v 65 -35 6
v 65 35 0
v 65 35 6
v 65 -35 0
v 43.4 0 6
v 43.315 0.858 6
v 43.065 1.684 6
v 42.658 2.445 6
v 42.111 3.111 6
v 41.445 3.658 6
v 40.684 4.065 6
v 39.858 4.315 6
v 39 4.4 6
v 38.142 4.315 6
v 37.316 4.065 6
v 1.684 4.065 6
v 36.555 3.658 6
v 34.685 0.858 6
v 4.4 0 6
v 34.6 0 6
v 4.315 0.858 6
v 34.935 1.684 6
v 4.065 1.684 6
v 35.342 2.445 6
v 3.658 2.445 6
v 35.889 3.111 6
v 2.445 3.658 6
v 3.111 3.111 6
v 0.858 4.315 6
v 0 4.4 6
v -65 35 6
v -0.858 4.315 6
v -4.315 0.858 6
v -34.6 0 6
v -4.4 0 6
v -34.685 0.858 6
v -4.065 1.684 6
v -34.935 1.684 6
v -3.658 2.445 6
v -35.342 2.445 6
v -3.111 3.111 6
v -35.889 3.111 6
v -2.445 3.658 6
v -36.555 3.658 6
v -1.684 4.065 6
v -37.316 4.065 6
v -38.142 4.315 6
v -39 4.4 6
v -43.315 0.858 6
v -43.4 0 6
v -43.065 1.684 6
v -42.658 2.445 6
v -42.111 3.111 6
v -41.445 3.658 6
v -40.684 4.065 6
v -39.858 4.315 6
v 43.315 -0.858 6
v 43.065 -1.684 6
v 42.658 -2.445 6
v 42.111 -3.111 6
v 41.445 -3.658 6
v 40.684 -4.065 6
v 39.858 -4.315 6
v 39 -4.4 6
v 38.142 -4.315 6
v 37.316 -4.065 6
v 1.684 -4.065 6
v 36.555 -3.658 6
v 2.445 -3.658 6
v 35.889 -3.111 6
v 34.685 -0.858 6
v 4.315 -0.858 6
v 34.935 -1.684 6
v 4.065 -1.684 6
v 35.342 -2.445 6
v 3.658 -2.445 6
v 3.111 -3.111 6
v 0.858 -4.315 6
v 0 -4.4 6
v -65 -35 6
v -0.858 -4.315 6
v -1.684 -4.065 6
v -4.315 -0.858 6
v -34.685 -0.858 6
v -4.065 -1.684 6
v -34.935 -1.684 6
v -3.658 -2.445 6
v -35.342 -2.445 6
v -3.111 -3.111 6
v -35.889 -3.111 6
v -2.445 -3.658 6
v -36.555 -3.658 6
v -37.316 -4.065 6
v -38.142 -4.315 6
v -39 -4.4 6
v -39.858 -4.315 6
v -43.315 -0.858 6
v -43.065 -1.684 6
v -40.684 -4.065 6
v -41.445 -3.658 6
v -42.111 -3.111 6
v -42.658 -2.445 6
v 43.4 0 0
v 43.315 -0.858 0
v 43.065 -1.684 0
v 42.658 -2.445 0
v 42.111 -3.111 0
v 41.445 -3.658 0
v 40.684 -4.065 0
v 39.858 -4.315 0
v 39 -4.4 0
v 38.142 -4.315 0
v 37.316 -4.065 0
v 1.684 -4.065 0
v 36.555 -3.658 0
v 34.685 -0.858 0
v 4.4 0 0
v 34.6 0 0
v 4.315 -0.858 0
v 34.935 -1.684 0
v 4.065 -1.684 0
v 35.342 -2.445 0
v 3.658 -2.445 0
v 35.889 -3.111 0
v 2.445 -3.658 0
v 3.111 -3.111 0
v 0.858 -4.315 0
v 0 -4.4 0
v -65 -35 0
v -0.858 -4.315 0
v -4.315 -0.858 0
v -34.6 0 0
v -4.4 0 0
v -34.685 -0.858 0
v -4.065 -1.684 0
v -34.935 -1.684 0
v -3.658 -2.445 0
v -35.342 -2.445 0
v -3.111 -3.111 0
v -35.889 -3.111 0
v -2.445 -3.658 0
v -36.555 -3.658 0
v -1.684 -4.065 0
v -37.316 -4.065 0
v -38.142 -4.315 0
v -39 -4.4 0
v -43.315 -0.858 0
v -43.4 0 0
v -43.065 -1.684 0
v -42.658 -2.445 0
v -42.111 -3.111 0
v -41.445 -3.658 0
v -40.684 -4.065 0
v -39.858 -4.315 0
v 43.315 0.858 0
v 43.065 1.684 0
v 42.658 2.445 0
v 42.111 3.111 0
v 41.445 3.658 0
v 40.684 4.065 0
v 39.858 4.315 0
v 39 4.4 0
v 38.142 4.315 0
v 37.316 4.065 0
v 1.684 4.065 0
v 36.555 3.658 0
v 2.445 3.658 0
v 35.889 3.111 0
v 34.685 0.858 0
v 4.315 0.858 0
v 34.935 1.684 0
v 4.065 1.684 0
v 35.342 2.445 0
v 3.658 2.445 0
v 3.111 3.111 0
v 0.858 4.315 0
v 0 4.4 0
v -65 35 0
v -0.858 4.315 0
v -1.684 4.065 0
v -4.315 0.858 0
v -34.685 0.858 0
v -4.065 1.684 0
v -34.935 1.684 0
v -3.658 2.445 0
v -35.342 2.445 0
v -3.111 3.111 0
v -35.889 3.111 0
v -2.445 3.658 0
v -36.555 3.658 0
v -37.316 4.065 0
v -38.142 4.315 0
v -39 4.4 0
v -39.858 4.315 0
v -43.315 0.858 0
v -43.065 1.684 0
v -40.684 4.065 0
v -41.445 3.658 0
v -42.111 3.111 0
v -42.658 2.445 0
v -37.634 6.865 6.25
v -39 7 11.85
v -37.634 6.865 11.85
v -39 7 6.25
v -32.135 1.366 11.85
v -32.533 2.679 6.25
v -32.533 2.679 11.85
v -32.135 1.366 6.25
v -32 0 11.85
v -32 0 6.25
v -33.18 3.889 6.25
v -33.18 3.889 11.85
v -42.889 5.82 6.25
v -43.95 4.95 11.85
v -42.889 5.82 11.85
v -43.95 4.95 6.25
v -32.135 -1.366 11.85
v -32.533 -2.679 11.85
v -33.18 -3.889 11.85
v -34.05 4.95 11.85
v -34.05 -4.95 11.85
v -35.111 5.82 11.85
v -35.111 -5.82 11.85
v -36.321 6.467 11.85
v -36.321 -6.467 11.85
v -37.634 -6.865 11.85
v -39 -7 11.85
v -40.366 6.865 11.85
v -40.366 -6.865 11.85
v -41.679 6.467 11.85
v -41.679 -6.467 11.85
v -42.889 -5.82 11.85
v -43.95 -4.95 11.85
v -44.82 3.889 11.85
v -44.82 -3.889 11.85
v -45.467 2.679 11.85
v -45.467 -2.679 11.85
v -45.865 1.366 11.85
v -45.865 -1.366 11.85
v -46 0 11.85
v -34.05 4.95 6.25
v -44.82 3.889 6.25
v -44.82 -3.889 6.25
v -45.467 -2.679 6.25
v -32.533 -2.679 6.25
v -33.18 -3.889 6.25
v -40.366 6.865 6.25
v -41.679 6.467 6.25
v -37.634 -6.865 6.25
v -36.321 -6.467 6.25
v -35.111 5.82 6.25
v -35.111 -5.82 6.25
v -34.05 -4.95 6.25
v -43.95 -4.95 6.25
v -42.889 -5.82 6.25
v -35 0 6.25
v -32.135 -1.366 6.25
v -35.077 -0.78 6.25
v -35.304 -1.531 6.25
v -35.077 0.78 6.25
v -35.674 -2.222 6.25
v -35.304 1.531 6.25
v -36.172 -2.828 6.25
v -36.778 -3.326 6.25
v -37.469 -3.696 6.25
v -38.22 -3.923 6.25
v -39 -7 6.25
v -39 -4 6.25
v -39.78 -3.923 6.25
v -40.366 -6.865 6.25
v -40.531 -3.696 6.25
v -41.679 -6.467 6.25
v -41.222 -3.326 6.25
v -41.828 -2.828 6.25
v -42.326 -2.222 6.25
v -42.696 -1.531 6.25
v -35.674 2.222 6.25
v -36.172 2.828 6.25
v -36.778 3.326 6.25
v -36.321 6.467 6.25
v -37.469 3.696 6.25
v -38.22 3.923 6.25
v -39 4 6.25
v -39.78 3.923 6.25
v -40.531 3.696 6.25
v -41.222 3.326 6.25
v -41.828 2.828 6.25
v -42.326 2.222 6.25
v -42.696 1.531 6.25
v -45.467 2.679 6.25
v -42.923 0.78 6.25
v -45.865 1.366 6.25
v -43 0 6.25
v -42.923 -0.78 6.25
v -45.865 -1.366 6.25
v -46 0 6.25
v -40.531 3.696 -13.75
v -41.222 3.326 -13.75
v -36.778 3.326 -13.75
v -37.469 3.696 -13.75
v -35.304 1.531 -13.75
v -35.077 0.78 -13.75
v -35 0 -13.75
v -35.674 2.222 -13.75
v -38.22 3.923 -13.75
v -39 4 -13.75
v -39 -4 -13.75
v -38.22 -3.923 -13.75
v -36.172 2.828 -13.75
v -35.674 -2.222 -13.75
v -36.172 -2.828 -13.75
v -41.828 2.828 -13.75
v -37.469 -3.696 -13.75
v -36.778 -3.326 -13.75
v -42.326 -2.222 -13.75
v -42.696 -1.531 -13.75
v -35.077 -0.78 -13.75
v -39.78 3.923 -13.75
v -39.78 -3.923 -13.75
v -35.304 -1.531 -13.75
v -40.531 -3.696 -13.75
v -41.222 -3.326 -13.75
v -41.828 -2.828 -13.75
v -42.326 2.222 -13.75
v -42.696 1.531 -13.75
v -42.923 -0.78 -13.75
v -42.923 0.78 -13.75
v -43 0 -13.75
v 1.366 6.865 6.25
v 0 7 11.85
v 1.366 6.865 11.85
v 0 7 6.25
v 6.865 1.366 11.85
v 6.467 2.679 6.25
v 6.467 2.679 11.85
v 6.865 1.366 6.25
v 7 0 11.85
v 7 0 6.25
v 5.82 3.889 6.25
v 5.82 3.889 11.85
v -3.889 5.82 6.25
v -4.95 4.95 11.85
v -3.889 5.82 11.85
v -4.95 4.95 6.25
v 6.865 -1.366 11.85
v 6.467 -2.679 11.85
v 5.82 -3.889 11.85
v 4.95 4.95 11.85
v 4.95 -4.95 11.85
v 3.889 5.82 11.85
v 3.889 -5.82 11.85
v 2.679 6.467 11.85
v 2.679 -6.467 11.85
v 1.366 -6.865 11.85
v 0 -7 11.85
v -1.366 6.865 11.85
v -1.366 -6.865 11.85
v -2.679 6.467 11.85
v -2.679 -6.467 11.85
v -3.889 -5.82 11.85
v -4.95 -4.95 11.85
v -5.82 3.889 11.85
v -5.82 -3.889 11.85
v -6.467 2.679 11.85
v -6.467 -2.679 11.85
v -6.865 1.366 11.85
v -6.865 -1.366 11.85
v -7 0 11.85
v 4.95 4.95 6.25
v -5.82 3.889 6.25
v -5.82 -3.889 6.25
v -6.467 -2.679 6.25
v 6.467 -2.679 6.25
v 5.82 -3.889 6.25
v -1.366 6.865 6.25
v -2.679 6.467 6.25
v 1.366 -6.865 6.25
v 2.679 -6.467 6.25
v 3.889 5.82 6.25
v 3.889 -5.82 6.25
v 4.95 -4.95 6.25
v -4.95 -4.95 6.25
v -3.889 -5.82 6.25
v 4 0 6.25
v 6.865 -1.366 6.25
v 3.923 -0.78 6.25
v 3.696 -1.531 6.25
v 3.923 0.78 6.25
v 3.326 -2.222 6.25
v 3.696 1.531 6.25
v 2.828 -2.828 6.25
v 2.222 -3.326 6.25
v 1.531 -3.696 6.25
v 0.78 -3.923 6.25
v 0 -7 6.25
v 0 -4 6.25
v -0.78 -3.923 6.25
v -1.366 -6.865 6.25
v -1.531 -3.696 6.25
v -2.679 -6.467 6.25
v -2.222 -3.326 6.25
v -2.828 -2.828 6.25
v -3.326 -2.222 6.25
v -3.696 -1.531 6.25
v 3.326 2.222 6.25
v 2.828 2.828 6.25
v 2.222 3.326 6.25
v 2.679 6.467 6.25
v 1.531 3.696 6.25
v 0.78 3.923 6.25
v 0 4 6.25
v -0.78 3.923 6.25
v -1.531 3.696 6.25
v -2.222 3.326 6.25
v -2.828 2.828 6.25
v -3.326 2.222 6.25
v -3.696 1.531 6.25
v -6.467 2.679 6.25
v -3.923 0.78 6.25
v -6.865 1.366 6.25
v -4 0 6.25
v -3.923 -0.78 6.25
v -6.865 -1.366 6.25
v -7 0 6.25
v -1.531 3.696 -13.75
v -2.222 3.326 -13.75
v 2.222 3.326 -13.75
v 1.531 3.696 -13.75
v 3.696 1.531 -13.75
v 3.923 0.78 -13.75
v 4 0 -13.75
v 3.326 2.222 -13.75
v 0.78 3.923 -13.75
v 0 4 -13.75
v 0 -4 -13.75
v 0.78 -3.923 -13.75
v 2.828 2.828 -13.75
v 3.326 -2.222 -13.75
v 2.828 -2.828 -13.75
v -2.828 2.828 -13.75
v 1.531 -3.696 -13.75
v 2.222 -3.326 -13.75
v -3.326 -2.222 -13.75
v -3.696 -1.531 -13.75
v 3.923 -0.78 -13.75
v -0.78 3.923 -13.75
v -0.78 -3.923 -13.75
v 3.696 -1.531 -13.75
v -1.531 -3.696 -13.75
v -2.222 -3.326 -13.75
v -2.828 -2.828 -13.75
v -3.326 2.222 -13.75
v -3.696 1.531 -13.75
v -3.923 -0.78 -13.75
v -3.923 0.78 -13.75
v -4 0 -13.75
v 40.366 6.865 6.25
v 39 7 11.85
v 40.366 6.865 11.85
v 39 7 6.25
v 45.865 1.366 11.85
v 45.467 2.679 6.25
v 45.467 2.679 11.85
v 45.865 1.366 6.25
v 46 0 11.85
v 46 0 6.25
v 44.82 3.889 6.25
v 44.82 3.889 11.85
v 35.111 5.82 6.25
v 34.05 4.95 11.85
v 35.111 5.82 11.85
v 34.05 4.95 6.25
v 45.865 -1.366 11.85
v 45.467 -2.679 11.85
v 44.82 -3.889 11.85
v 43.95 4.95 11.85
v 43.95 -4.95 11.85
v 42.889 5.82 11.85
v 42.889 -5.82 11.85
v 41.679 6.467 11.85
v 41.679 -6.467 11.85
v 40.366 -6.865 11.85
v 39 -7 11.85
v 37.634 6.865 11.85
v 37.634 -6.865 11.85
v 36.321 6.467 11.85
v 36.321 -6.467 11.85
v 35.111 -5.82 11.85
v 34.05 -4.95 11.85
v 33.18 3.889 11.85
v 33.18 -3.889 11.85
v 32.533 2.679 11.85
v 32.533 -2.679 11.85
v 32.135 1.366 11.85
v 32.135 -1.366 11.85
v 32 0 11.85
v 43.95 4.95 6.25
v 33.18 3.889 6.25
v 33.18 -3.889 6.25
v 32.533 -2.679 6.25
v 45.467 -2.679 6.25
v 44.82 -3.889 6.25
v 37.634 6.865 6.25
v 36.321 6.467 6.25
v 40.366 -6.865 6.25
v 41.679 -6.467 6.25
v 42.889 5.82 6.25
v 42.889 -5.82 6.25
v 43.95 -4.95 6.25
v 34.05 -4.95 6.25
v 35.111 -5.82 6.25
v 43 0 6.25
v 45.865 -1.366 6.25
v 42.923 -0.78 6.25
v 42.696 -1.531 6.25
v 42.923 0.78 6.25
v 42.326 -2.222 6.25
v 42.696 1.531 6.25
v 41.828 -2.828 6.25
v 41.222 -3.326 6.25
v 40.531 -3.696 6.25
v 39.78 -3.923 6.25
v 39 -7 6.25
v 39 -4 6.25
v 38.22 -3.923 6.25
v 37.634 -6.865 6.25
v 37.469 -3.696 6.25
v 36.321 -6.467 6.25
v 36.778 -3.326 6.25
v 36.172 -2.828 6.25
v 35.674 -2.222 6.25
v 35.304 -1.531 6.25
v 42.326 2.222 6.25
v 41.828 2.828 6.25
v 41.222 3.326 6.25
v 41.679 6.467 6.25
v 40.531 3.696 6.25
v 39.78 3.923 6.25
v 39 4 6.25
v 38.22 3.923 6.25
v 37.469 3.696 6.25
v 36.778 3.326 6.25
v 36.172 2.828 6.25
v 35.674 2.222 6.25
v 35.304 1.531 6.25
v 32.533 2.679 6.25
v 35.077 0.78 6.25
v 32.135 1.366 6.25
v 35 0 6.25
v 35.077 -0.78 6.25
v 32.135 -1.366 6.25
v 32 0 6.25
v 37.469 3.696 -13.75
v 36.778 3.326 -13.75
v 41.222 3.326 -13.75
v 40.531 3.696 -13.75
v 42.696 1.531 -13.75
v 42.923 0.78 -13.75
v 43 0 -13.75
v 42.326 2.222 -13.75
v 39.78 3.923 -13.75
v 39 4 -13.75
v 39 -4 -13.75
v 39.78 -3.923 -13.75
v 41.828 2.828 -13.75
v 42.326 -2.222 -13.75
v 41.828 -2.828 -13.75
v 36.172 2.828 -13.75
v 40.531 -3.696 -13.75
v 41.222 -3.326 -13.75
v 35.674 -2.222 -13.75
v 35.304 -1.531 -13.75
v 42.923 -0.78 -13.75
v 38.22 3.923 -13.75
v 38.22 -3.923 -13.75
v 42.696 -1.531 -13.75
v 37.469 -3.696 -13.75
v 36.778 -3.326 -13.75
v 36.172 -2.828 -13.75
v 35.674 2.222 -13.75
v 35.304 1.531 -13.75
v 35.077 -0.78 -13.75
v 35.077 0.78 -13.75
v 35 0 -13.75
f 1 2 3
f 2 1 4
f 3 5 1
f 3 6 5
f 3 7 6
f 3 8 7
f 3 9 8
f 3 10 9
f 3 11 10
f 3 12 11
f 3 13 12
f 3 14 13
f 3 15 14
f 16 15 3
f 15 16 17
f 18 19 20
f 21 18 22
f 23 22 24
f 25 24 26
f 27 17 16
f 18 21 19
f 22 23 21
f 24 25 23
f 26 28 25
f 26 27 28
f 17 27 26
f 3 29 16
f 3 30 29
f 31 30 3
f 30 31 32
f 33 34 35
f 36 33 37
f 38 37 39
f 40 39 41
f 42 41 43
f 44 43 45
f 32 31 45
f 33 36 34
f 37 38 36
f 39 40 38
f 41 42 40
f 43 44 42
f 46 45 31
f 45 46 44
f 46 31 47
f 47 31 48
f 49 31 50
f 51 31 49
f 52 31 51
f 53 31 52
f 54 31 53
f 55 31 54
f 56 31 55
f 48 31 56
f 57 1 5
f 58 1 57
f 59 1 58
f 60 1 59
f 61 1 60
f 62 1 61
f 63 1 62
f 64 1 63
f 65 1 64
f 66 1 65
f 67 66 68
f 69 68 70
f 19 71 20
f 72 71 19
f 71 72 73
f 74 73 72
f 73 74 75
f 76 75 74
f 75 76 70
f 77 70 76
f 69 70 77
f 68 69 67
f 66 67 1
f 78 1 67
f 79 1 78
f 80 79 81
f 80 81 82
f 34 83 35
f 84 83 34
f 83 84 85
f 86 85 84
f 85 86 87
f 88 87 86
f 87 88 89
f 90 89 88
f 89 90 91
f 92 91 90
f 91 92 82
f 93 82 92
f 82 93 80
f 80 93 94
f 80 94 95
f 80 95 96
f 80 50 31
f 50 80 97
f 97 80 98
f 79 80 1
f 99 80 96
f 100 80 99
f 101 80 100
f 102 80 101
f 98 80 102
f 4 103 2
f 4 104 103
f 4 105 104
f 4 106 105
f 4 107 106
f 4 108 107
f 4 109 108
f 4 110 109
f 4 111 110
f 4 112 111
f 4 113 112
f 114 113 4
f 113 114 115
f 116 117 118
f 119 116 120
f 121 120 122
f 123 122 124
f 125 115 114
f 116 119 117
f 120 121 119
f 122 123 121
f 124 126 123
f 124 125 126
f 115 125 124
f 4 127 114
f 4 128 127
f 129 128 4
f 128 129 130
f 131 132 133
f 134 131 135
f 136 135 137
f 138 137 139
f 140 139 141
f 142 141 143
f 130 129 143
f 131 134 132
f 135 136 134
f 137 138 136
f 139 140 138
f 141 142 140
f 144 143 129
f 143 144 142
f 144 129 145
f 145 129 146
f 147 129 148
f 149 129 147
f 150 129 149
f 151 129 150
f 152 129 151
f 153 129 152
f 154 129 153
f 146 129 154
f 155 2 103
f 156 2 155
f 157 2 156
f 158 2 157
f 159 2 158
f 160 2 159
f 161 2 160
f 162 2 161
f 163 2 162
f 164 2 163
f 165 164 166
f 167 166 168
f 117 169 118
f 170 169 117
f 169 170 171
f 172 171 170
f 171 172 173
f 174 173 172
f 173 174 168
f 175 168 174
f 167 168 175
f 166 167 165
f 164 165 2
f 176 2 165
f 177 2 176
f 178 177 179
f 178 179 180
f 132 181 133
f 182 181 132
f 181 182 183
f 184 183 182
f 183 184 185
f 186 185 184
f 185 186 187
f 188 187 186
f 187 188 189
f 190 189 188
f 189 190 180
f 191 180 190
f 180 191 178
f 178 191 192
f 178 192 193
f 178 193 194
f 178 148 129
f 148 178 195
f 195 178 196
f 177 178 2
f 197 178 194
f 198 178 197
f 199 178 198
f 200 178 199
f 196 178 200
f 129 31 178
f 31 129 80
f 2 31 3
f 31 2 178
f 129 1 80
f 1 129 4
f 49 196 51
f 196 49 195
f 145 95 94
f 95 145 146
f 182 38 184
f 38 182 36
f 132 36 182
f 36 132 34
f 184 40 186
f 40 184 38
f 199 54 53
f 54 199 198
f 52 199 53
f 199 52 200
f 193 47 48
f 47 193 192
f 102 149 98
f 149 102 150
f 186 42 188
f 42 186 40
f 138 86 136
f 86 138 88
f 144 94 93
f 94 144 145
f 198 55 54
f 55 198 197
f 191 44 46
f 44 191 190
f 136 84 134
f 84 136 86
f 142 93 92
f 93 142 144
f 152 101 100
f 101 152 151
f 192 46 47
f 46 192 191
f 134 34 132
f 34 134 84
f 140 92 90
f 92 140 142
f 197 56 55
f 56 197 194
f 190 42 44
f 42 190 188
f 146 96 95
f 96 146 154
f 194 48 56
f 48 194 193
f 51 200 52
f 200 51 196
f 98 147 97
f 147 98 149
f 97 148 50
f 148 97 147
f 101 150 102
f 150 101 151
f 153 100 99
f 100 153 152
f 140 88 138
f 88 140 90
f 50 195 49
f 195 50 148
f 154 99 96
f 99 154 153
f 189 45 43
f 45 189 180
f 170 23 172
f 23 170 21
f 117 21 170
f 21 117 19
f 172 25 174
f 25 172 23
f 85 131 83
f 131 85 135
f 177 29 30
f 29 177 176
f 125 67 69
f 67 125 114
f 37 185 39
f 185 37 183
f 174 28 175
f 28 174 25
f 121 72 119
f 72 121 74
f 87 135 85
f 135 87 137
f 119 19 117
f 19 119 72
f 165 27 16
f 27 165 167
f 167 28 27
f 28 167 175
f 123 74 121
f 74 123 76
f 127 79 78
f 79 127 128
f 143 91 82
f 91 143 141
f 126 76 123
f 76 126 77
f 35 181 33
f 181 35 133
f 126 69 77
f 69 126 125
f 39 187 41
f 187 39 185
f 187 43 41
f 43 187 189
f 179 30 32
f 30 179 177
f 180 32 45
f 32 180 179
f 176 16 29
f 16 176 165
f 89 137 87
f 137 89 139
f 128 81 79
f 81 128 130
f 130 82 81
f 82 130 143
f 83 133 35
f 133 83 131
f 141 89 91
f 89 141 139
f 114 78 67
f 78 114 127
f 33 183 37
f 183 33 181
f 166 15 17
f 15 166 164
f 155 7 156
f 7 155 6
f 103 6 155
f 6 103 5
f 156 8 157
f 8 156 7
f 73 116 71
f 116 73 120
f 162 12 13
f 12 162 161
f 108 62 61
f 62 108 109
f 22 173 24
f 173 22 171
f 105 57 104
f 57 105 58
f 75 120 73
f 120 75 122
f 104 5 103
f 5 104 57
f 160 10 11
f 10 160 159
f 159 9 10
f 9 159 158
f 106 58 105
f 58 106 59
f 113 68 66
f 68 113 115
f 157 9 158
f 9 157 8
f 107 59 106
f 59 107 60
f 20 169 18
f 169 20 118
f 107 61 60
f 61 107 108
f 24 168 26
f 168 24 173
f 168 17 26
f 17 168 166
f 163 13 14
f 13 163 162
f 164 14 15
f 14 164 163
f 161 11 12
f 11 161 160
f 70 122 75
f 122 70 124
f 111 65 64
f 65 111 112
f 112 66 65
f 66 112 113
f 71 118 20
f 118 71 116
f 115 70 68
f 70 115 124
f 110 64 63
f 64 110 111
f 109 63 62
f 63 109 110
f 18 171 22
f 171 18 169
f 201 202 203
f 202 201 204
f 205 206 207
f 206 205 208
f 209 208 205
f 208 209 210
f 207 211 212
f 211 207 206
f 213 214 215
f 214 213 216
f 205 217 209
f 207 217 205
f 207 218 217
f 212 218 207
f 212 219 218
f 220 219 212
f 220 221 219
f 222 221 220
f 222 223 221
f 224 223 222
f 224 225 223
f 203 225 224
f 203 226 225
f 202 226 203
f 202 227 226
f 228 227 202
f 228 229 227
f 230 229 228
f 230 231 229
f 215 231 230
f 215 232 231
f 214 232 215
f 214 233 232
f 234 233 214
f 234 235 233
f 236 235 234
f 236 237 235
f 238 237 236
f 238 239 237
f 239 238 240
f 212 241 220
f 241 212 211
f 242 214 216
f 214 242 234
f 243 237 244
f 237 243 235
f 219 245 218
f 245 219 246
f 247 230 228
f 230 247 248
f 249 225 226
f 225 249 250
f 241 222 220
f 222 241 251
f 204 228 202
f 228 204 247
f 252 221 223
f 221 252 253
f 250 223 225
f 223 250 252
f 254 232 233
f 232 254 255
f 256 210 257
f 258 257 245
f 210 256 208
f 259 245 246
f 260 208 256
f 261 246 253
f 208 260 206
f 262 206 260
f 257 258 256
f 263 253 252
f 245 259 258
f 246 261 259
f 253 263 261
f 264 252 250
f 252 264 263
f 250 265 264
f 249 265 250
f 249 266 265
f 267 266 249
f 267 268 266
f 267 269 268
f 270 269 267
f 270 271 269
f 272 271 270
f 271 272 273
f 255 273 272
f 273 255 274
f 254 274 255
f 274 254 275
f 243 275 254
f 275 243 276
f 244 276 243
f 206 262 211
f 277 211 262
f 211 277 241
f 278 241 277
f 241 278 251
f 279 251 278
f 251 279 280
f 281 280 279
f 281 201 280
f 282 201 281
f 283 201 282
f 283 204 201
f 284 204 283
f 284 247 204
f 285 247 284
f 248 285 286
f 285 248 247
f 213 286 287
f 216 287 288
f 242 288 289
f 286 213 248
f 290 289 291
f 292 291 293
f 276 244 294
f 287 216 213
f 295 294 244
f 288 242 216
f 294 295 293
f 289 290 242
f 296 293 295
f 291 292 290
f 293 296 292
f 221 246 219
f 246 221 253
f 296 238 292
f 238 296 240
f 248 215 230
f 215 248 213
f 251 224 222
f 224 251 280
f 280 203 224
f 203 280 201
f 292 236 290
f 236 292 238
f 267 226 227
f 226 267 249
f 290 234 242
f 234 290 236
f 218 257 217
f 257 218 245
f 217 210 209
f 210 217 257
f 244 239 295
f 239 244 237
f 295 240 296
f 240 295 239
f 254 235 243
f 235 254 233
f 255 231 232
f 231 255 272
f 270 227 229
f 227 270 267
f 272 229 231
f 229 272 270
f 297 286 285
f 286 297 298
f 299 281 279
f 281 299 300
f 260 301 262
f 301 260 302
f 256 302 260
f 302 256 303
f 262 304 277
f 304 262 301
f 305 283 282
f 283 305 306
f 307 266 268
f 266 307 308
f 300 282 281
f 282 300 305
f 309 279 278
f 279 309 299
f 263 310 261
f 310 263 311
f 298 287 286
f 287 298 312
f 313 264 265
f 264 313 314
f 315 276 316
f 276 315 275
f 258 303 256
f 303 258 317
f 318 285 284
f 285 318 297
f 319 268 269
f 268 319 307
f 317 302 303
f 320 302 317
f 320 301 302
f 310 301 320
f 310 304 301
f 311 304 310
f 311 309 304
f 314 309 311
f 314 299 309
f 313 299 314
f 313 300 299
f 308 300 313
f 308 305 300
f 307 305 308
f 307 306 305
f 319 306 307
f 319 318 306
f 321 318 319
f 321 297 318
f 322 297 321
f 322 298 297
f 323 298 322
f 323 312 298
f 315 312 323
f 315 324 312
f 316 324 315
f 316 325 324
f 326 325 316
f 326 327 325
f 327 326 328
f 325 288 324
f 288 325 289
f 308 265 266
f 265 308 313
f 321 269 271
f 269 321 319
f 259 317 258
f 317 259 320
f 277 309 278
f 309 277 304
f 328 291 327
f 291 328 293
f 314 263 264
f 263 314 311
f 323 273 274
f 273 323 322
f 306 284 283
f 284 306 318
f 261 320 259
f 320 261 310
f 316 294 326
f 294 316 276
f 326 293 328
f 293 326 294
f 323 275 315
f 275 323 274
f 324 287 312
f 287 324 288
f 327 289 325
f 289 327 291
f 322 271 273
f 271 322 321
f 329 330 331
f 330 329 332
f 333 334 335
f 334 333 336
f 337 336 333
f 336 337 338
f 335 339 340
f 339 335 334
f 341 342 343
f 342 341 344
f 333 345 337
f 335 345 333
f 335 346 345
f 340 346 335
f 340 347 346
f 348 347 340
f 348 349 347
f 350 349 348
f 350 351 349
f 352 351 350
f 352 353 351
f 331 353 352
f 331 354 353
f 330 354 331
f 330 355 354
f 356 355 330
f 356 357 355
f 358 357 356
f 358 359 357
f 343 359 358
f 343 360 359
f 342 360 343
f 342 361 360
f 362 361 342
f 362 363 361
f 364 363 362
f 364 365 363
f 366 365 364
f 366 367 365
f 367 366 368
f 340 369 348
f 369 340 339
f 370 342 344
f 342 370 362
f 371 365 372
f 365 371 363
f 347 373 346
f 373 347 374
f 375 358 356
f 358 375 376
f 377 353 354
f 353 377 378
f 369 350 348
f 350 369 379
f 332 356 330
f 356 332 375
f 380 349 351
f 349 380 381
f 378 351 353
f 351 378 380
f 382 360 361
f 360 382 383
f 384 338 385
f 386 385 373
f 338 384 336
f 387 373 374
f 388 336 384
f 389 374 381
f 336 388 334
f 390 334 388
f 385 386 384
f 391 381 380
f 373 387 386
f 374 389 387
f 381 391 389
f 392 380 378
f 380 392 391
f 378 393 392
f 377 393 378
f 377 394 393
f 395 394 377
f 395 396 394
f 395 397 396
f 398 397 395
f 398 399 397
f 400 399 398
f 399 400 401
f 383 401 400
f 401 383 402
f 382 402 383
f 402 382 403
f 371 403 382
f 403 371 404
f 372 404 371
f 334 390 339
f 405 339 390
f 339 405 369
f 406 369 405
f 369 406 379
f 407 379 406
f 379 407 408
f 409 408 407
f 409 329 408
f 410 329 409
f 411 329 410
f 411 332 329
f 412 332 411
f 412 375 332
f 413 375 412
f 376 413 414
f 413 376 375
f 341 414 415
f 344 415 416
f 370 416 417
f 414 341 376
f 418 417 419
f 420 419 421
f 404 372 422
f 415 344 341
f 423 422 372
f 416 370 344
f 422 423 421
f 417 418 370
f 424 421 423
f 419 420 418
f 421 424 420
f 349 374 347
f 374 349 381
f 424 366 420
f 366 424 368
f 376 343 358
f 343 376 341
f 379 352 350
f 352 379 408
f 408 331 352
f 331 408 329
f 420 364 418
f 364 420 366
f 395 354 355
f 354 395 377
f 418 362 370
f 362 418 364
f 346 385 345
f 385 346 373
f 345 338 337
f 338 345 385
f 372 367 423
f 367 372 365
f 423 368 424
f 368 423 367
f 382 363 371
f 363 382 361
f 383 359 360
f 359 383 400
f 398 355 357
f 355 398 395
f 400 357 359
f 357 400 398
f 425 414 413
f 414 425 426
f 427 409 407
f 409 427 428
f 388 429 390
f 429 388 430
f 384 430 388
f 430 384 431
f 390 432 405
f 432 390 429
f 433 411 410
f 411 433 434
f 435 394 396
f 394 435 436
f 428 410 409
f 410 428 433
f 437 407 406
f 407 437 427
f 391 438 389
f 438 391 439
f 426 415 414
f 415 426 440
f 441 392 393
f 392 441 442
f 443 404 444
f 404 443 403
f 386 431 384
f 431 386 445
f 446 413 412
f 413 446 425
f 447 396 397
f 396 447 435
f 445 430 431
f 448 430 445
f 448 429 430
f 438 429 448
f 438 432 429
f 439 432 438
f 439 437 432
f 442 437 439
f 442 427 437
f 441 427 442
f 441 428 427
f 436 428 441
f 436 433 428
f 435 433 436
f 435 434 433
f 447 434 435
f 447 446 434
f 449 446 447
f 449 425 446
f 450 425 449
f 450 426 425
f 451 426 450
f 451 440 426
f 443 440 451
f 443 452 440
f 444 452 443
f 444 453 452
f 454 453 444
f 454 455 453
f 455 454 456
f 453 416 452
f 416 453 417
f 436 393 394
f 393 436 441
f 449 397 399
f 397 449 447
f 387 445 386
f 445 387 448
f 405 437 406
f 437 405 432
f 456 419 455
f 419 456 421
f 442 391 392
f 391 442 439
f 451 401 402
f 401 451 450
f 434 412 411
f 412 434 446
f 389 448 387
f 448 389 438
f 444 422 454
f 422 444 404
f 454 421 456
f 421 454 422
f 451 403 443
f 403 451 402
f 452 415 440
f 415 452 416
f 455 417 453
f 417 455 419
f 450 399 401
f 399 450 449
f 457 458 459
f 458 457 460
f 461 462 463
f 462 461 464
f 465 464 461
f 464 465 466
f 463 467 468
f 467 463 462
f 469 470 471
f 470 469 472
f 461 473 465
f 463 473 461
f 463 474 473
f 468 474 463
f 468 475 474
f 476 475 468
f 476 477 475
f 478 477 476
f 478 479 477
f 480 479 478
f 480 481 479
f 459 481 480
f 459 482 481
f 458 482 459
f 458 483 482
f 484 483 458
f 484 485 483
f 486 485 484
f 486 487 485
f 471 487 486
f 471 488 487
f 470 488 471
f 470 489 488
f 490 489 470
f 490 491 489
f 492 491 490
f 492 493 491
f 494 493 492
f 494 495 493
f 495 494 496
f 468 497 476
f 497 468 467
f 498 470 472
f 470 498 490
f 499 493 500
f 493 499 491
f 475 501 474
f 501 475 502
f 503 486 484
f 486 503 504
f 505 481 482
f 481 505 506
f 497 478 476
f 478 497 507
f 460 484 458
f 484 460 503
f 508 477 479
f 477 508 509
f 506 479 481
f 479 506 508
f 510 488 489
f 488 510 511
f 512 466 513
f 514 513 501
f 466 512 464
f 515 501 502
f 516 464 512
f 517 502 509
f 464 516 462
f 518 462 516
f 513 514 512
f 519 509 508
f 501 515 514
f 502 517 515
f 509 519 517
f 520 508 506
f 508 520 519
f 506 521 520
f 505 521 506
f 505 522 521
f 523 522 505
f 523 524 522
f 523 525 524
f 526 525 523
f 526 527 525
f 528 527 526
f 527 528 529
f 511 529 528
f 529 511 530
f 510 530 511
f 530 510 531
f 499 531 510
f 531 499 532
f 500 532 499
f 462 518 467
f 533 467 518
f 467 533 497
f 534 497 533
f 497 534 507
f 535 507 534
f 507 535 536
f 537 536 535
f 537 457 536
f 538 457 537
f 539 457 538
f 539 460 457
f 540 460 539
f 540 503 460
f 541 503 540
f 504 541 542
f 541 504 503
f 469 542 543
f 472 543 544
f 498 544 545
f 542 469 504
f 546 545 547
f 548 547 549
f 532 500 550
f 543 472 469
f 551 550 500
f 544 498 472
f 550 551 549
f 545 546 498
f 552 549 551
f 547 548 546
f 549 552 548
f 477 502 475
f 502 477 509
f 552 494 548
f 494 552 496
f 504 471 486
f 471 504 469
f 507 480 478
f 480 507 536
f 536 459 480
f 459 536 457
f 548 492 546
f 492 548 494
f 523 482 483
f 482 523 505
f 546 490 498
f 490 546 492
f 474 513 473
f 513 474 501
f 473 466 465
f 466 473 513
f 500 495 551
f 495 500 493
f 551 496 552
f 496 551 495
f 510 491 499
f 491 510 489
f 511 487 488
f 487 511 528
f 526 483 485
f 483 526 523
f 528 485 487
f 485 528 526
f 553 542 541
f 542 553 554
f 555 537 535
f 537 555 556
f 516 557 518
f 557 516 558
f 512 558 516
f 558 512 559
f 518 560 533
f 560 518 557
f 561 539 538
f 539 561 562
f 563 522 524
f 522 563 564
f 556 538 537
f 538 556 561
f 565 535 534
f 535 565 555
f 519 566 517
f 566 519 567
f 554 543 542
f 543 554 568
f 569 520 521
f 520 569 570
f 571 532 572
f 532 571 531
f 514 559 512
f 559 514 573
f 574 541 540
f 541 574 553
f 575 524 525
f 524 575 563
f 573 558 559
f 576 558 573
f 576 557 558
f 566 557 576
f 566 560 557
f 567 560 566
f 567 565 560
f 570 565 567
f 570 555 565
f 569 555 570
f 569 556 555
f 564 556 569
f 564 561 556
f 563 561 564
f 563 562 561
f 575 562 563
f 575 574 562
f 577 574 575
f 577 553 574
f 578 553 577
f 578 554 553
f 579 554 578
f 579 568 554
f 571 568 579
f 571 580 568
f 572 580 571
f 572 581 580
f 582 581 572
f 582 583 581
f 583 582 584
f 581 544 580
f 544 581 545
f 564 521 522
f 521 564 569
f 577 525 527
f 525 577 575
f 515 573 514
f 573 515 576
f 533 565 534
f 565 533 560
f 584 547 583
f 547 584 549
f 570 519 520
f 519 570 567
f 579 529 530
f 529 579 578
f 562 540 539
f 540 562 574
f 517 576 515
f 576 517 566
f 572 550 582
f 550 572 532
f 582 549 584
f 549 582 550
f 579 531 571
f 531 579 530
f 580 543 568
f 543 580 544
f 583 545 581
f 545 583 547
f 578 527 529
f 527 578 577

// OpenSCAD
$fn = 32;

// ------------------------------------------------------------------------
// Bolted plate: 130 x 70 x 6 mm plate, 3 fasteners
// Every part is its own module, assembly() places them once.
// ------------------------------------------------------------------------

// --- part 1 ---
module plate() {
  difference() {
    translate([-65, -35, 0]) cube([130, 70, 6]);
    translate([-39, 0, -1]) cylinder(h = 8, d = 8.8);
    translate([0, 0, -1]) cylinder(h = 8, d = 8.8);
    translate([39, 0, -1]) cylinder(h = 8, d = 8.8);
  }
}

// --- part 2 ---
module bolt1() {
  cylinder(h = 5.6, d = 14);
  translate([0, 0, -20]) cylinder(h = 20, d = 8);
}

// --- part 3 ---
module bolt2() {
  cylinder(h = 5.6, d = 14);
  translate([0, 0, -20]) cylinder(h = 20, d = 8);
}

// --- part 4 ---
module bolt3() {
  cylinder(h = 5.6, d = 14);
  translate([0, 0, -20]) cylinder(h = 20, d = 8);
}

// --- assembly ---
module assembly() {
  translate([0, 0, 0]) rotate([0, 0, 0]) plate();
  translate([-39, 0, 6.25]) rotate([0, 0, 0]) bolt1();
  translate([0, 0, 6.25]) rotate([0, 0, 0]) bolt2();
  translate([39, 0, 6.25]) rotate([0, 0, 0]) bolt3();
}

assembly();
